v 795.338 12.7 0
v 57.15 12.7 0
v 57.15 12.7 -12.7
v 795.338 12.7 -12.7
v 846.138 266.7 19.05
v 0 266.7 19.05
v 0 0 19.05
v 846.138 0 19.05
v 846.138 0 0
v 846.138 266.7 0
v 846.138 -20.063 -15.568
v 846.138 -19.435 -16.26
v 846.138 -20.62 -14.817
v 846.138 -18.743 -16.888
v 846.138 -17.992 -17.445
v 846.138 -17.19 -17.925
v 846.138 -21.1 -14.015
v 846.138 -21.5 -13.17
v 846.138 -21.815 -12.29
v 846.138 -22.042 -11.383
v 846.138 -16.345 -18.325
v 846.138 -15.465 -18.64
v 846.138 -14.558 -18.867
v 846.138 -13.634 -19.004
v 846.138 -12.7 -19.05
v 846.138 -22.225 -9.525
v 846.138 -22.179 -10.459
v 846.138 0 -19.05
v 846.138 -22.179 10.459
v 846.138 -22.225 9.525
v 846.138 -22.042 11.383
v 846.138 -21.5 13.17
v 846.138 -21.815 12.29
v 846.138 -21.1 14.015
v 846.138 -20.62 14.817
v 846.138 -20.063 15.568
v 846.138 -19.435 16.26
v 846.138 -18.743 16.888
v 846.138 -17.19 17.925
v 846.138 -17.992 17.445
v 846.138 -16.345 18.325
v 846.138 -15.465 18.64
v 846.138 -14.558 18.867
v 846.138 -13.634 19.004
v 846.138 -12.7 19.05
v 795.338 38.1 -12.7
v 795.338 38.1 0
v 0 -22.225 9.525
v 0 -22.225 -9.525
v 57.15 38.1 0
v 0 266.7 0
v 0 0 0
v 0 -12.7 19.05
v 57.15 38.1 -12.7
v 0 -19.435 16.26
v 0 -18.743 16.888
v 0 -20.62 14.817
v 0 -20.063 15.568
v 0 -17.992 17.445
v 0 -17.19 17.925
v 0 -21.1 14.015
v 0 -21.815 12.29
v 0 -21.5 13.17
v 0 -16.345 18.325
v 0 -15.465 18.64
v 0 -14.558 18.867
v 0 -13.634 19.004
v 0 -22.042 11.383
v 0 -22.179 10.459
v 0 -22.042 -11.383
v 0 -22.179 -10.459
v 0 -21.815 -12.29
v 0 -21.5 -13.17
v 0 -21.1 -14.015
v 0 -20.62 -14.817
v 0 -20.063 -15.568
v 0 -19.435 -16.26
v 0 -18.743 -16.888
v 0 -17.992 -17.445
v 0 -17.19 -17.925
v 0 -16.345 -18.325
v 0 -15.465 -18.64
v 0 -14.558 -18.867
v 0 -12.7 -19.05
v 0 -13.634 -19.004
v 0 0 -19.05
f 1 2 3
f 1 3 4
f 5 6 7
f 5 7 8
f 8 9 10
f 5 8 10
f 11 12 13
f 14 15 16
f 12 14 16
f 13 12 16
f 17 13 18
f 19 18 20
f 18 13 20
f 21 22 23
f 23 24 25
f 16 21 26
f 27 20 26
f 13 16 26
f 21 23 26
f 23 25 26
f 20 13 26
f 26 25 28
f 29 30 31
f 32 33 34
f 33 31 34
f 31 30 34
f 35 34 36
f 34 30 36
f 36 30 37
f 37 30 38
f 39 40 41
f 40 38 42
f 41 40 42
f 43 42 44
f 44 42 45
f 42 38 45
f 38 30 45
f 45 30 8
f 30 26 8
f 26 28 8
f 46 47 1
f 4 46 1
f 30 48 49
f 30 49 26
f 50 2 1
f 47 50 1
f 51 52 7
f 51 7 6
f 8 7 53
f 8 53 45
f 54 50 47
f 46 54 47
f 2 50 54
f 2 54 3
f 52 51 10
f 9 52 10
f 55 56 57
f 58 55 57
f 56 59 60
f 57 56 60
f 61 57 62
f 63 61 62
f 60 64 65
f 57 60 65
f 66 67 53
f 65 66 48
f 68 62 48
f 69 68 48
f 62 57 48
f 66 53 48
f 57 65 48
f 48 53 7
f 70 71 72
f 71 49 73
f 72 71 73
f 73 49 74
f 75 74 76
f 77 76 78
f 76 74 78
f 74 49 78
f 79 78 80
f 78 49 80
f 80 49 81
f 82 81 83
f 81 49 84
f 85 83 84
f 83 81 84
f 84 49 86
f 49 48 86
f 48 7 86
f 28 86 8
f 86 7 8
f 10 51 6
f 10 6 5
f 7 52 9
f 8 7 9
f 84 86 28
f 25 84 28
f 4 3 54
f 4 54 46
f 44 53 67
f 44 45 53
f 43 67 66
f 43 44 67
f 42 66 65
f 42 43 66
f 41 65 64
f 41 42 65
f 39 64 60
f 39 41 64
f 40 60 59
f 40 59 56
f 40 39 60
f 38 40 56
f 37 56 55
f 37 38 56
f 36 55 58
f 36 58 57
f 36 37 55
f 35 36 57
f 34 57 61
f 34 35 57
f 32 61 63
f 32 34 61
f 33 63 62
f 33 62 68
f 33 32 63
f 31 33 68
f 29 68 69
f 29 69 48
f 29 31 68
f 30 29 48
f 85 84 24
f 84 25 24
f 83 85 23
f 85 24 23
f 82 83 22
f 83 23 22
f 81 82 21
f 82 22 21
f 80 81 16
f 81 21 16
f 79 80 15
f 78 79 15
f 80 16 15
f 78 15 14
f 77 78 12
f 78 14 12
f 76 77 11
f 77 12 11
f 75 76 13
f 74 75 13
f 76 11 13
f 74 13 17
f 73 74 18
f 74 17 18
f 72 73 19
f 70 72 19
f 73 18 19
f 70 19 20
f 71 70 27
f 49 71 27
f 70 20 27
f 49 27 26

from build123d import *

# Parameters (mm, degrees)
F0_W     = 846.1375
F0_H     = 266.7
F1_DEPTH = 19.05
F2_W     = 846.1375
F2_H     = 19.05
F3_DEPTH = 22.225
F4_R     = 9.525
F5_W     = 738.1875
F5_H     = 25.4
F6_DEPTH = 12.7


with BuildPart() as f1:
    # F0 (on Top) → F1 (new body)
    with BuildSketch(Plane.XY):
        with Locations((423.06875, 133.35)):
            Rectangle(F0_W, F0_H)
    extrude(amount=F1_DEPTH)


with BuildPart() as f3:
    # F2 (on face) → F3 (new body)
    with BuildSketch(Plane.XZ):
        with Locations((423.06875, -9.525)):
            Rectangle(F2_W, F2_H)
        with Locations((423.06875, 9.525)):
            Rectangle(F2_W, F2_H)
    extrude(amount=F3_DEPTH)

    # F4
    f4_edges = [f3.edges().sort_by_distance(p)[0] for p in [
        (423.06875, -22.225, 19.05),
        (423.06875, -22.225, -19.05),
    ]]
    fillet(f4_edges, radius=F4_R)


with BuildPart() as f6:
    # F5 (on face) → F6 (new body)
    with BuildSketch(Plane(origin=(0, 0, 0), x_dir=(1, 0, 0), z_dir=(0, 0, -1))):
        with Locations((426.24375, -25.4)):
            Rectangle(F5_W, F5_H)
    extrude(amount=F6_DEPTH)


solid = Compound([f1.part, f3.part, f6.part])
